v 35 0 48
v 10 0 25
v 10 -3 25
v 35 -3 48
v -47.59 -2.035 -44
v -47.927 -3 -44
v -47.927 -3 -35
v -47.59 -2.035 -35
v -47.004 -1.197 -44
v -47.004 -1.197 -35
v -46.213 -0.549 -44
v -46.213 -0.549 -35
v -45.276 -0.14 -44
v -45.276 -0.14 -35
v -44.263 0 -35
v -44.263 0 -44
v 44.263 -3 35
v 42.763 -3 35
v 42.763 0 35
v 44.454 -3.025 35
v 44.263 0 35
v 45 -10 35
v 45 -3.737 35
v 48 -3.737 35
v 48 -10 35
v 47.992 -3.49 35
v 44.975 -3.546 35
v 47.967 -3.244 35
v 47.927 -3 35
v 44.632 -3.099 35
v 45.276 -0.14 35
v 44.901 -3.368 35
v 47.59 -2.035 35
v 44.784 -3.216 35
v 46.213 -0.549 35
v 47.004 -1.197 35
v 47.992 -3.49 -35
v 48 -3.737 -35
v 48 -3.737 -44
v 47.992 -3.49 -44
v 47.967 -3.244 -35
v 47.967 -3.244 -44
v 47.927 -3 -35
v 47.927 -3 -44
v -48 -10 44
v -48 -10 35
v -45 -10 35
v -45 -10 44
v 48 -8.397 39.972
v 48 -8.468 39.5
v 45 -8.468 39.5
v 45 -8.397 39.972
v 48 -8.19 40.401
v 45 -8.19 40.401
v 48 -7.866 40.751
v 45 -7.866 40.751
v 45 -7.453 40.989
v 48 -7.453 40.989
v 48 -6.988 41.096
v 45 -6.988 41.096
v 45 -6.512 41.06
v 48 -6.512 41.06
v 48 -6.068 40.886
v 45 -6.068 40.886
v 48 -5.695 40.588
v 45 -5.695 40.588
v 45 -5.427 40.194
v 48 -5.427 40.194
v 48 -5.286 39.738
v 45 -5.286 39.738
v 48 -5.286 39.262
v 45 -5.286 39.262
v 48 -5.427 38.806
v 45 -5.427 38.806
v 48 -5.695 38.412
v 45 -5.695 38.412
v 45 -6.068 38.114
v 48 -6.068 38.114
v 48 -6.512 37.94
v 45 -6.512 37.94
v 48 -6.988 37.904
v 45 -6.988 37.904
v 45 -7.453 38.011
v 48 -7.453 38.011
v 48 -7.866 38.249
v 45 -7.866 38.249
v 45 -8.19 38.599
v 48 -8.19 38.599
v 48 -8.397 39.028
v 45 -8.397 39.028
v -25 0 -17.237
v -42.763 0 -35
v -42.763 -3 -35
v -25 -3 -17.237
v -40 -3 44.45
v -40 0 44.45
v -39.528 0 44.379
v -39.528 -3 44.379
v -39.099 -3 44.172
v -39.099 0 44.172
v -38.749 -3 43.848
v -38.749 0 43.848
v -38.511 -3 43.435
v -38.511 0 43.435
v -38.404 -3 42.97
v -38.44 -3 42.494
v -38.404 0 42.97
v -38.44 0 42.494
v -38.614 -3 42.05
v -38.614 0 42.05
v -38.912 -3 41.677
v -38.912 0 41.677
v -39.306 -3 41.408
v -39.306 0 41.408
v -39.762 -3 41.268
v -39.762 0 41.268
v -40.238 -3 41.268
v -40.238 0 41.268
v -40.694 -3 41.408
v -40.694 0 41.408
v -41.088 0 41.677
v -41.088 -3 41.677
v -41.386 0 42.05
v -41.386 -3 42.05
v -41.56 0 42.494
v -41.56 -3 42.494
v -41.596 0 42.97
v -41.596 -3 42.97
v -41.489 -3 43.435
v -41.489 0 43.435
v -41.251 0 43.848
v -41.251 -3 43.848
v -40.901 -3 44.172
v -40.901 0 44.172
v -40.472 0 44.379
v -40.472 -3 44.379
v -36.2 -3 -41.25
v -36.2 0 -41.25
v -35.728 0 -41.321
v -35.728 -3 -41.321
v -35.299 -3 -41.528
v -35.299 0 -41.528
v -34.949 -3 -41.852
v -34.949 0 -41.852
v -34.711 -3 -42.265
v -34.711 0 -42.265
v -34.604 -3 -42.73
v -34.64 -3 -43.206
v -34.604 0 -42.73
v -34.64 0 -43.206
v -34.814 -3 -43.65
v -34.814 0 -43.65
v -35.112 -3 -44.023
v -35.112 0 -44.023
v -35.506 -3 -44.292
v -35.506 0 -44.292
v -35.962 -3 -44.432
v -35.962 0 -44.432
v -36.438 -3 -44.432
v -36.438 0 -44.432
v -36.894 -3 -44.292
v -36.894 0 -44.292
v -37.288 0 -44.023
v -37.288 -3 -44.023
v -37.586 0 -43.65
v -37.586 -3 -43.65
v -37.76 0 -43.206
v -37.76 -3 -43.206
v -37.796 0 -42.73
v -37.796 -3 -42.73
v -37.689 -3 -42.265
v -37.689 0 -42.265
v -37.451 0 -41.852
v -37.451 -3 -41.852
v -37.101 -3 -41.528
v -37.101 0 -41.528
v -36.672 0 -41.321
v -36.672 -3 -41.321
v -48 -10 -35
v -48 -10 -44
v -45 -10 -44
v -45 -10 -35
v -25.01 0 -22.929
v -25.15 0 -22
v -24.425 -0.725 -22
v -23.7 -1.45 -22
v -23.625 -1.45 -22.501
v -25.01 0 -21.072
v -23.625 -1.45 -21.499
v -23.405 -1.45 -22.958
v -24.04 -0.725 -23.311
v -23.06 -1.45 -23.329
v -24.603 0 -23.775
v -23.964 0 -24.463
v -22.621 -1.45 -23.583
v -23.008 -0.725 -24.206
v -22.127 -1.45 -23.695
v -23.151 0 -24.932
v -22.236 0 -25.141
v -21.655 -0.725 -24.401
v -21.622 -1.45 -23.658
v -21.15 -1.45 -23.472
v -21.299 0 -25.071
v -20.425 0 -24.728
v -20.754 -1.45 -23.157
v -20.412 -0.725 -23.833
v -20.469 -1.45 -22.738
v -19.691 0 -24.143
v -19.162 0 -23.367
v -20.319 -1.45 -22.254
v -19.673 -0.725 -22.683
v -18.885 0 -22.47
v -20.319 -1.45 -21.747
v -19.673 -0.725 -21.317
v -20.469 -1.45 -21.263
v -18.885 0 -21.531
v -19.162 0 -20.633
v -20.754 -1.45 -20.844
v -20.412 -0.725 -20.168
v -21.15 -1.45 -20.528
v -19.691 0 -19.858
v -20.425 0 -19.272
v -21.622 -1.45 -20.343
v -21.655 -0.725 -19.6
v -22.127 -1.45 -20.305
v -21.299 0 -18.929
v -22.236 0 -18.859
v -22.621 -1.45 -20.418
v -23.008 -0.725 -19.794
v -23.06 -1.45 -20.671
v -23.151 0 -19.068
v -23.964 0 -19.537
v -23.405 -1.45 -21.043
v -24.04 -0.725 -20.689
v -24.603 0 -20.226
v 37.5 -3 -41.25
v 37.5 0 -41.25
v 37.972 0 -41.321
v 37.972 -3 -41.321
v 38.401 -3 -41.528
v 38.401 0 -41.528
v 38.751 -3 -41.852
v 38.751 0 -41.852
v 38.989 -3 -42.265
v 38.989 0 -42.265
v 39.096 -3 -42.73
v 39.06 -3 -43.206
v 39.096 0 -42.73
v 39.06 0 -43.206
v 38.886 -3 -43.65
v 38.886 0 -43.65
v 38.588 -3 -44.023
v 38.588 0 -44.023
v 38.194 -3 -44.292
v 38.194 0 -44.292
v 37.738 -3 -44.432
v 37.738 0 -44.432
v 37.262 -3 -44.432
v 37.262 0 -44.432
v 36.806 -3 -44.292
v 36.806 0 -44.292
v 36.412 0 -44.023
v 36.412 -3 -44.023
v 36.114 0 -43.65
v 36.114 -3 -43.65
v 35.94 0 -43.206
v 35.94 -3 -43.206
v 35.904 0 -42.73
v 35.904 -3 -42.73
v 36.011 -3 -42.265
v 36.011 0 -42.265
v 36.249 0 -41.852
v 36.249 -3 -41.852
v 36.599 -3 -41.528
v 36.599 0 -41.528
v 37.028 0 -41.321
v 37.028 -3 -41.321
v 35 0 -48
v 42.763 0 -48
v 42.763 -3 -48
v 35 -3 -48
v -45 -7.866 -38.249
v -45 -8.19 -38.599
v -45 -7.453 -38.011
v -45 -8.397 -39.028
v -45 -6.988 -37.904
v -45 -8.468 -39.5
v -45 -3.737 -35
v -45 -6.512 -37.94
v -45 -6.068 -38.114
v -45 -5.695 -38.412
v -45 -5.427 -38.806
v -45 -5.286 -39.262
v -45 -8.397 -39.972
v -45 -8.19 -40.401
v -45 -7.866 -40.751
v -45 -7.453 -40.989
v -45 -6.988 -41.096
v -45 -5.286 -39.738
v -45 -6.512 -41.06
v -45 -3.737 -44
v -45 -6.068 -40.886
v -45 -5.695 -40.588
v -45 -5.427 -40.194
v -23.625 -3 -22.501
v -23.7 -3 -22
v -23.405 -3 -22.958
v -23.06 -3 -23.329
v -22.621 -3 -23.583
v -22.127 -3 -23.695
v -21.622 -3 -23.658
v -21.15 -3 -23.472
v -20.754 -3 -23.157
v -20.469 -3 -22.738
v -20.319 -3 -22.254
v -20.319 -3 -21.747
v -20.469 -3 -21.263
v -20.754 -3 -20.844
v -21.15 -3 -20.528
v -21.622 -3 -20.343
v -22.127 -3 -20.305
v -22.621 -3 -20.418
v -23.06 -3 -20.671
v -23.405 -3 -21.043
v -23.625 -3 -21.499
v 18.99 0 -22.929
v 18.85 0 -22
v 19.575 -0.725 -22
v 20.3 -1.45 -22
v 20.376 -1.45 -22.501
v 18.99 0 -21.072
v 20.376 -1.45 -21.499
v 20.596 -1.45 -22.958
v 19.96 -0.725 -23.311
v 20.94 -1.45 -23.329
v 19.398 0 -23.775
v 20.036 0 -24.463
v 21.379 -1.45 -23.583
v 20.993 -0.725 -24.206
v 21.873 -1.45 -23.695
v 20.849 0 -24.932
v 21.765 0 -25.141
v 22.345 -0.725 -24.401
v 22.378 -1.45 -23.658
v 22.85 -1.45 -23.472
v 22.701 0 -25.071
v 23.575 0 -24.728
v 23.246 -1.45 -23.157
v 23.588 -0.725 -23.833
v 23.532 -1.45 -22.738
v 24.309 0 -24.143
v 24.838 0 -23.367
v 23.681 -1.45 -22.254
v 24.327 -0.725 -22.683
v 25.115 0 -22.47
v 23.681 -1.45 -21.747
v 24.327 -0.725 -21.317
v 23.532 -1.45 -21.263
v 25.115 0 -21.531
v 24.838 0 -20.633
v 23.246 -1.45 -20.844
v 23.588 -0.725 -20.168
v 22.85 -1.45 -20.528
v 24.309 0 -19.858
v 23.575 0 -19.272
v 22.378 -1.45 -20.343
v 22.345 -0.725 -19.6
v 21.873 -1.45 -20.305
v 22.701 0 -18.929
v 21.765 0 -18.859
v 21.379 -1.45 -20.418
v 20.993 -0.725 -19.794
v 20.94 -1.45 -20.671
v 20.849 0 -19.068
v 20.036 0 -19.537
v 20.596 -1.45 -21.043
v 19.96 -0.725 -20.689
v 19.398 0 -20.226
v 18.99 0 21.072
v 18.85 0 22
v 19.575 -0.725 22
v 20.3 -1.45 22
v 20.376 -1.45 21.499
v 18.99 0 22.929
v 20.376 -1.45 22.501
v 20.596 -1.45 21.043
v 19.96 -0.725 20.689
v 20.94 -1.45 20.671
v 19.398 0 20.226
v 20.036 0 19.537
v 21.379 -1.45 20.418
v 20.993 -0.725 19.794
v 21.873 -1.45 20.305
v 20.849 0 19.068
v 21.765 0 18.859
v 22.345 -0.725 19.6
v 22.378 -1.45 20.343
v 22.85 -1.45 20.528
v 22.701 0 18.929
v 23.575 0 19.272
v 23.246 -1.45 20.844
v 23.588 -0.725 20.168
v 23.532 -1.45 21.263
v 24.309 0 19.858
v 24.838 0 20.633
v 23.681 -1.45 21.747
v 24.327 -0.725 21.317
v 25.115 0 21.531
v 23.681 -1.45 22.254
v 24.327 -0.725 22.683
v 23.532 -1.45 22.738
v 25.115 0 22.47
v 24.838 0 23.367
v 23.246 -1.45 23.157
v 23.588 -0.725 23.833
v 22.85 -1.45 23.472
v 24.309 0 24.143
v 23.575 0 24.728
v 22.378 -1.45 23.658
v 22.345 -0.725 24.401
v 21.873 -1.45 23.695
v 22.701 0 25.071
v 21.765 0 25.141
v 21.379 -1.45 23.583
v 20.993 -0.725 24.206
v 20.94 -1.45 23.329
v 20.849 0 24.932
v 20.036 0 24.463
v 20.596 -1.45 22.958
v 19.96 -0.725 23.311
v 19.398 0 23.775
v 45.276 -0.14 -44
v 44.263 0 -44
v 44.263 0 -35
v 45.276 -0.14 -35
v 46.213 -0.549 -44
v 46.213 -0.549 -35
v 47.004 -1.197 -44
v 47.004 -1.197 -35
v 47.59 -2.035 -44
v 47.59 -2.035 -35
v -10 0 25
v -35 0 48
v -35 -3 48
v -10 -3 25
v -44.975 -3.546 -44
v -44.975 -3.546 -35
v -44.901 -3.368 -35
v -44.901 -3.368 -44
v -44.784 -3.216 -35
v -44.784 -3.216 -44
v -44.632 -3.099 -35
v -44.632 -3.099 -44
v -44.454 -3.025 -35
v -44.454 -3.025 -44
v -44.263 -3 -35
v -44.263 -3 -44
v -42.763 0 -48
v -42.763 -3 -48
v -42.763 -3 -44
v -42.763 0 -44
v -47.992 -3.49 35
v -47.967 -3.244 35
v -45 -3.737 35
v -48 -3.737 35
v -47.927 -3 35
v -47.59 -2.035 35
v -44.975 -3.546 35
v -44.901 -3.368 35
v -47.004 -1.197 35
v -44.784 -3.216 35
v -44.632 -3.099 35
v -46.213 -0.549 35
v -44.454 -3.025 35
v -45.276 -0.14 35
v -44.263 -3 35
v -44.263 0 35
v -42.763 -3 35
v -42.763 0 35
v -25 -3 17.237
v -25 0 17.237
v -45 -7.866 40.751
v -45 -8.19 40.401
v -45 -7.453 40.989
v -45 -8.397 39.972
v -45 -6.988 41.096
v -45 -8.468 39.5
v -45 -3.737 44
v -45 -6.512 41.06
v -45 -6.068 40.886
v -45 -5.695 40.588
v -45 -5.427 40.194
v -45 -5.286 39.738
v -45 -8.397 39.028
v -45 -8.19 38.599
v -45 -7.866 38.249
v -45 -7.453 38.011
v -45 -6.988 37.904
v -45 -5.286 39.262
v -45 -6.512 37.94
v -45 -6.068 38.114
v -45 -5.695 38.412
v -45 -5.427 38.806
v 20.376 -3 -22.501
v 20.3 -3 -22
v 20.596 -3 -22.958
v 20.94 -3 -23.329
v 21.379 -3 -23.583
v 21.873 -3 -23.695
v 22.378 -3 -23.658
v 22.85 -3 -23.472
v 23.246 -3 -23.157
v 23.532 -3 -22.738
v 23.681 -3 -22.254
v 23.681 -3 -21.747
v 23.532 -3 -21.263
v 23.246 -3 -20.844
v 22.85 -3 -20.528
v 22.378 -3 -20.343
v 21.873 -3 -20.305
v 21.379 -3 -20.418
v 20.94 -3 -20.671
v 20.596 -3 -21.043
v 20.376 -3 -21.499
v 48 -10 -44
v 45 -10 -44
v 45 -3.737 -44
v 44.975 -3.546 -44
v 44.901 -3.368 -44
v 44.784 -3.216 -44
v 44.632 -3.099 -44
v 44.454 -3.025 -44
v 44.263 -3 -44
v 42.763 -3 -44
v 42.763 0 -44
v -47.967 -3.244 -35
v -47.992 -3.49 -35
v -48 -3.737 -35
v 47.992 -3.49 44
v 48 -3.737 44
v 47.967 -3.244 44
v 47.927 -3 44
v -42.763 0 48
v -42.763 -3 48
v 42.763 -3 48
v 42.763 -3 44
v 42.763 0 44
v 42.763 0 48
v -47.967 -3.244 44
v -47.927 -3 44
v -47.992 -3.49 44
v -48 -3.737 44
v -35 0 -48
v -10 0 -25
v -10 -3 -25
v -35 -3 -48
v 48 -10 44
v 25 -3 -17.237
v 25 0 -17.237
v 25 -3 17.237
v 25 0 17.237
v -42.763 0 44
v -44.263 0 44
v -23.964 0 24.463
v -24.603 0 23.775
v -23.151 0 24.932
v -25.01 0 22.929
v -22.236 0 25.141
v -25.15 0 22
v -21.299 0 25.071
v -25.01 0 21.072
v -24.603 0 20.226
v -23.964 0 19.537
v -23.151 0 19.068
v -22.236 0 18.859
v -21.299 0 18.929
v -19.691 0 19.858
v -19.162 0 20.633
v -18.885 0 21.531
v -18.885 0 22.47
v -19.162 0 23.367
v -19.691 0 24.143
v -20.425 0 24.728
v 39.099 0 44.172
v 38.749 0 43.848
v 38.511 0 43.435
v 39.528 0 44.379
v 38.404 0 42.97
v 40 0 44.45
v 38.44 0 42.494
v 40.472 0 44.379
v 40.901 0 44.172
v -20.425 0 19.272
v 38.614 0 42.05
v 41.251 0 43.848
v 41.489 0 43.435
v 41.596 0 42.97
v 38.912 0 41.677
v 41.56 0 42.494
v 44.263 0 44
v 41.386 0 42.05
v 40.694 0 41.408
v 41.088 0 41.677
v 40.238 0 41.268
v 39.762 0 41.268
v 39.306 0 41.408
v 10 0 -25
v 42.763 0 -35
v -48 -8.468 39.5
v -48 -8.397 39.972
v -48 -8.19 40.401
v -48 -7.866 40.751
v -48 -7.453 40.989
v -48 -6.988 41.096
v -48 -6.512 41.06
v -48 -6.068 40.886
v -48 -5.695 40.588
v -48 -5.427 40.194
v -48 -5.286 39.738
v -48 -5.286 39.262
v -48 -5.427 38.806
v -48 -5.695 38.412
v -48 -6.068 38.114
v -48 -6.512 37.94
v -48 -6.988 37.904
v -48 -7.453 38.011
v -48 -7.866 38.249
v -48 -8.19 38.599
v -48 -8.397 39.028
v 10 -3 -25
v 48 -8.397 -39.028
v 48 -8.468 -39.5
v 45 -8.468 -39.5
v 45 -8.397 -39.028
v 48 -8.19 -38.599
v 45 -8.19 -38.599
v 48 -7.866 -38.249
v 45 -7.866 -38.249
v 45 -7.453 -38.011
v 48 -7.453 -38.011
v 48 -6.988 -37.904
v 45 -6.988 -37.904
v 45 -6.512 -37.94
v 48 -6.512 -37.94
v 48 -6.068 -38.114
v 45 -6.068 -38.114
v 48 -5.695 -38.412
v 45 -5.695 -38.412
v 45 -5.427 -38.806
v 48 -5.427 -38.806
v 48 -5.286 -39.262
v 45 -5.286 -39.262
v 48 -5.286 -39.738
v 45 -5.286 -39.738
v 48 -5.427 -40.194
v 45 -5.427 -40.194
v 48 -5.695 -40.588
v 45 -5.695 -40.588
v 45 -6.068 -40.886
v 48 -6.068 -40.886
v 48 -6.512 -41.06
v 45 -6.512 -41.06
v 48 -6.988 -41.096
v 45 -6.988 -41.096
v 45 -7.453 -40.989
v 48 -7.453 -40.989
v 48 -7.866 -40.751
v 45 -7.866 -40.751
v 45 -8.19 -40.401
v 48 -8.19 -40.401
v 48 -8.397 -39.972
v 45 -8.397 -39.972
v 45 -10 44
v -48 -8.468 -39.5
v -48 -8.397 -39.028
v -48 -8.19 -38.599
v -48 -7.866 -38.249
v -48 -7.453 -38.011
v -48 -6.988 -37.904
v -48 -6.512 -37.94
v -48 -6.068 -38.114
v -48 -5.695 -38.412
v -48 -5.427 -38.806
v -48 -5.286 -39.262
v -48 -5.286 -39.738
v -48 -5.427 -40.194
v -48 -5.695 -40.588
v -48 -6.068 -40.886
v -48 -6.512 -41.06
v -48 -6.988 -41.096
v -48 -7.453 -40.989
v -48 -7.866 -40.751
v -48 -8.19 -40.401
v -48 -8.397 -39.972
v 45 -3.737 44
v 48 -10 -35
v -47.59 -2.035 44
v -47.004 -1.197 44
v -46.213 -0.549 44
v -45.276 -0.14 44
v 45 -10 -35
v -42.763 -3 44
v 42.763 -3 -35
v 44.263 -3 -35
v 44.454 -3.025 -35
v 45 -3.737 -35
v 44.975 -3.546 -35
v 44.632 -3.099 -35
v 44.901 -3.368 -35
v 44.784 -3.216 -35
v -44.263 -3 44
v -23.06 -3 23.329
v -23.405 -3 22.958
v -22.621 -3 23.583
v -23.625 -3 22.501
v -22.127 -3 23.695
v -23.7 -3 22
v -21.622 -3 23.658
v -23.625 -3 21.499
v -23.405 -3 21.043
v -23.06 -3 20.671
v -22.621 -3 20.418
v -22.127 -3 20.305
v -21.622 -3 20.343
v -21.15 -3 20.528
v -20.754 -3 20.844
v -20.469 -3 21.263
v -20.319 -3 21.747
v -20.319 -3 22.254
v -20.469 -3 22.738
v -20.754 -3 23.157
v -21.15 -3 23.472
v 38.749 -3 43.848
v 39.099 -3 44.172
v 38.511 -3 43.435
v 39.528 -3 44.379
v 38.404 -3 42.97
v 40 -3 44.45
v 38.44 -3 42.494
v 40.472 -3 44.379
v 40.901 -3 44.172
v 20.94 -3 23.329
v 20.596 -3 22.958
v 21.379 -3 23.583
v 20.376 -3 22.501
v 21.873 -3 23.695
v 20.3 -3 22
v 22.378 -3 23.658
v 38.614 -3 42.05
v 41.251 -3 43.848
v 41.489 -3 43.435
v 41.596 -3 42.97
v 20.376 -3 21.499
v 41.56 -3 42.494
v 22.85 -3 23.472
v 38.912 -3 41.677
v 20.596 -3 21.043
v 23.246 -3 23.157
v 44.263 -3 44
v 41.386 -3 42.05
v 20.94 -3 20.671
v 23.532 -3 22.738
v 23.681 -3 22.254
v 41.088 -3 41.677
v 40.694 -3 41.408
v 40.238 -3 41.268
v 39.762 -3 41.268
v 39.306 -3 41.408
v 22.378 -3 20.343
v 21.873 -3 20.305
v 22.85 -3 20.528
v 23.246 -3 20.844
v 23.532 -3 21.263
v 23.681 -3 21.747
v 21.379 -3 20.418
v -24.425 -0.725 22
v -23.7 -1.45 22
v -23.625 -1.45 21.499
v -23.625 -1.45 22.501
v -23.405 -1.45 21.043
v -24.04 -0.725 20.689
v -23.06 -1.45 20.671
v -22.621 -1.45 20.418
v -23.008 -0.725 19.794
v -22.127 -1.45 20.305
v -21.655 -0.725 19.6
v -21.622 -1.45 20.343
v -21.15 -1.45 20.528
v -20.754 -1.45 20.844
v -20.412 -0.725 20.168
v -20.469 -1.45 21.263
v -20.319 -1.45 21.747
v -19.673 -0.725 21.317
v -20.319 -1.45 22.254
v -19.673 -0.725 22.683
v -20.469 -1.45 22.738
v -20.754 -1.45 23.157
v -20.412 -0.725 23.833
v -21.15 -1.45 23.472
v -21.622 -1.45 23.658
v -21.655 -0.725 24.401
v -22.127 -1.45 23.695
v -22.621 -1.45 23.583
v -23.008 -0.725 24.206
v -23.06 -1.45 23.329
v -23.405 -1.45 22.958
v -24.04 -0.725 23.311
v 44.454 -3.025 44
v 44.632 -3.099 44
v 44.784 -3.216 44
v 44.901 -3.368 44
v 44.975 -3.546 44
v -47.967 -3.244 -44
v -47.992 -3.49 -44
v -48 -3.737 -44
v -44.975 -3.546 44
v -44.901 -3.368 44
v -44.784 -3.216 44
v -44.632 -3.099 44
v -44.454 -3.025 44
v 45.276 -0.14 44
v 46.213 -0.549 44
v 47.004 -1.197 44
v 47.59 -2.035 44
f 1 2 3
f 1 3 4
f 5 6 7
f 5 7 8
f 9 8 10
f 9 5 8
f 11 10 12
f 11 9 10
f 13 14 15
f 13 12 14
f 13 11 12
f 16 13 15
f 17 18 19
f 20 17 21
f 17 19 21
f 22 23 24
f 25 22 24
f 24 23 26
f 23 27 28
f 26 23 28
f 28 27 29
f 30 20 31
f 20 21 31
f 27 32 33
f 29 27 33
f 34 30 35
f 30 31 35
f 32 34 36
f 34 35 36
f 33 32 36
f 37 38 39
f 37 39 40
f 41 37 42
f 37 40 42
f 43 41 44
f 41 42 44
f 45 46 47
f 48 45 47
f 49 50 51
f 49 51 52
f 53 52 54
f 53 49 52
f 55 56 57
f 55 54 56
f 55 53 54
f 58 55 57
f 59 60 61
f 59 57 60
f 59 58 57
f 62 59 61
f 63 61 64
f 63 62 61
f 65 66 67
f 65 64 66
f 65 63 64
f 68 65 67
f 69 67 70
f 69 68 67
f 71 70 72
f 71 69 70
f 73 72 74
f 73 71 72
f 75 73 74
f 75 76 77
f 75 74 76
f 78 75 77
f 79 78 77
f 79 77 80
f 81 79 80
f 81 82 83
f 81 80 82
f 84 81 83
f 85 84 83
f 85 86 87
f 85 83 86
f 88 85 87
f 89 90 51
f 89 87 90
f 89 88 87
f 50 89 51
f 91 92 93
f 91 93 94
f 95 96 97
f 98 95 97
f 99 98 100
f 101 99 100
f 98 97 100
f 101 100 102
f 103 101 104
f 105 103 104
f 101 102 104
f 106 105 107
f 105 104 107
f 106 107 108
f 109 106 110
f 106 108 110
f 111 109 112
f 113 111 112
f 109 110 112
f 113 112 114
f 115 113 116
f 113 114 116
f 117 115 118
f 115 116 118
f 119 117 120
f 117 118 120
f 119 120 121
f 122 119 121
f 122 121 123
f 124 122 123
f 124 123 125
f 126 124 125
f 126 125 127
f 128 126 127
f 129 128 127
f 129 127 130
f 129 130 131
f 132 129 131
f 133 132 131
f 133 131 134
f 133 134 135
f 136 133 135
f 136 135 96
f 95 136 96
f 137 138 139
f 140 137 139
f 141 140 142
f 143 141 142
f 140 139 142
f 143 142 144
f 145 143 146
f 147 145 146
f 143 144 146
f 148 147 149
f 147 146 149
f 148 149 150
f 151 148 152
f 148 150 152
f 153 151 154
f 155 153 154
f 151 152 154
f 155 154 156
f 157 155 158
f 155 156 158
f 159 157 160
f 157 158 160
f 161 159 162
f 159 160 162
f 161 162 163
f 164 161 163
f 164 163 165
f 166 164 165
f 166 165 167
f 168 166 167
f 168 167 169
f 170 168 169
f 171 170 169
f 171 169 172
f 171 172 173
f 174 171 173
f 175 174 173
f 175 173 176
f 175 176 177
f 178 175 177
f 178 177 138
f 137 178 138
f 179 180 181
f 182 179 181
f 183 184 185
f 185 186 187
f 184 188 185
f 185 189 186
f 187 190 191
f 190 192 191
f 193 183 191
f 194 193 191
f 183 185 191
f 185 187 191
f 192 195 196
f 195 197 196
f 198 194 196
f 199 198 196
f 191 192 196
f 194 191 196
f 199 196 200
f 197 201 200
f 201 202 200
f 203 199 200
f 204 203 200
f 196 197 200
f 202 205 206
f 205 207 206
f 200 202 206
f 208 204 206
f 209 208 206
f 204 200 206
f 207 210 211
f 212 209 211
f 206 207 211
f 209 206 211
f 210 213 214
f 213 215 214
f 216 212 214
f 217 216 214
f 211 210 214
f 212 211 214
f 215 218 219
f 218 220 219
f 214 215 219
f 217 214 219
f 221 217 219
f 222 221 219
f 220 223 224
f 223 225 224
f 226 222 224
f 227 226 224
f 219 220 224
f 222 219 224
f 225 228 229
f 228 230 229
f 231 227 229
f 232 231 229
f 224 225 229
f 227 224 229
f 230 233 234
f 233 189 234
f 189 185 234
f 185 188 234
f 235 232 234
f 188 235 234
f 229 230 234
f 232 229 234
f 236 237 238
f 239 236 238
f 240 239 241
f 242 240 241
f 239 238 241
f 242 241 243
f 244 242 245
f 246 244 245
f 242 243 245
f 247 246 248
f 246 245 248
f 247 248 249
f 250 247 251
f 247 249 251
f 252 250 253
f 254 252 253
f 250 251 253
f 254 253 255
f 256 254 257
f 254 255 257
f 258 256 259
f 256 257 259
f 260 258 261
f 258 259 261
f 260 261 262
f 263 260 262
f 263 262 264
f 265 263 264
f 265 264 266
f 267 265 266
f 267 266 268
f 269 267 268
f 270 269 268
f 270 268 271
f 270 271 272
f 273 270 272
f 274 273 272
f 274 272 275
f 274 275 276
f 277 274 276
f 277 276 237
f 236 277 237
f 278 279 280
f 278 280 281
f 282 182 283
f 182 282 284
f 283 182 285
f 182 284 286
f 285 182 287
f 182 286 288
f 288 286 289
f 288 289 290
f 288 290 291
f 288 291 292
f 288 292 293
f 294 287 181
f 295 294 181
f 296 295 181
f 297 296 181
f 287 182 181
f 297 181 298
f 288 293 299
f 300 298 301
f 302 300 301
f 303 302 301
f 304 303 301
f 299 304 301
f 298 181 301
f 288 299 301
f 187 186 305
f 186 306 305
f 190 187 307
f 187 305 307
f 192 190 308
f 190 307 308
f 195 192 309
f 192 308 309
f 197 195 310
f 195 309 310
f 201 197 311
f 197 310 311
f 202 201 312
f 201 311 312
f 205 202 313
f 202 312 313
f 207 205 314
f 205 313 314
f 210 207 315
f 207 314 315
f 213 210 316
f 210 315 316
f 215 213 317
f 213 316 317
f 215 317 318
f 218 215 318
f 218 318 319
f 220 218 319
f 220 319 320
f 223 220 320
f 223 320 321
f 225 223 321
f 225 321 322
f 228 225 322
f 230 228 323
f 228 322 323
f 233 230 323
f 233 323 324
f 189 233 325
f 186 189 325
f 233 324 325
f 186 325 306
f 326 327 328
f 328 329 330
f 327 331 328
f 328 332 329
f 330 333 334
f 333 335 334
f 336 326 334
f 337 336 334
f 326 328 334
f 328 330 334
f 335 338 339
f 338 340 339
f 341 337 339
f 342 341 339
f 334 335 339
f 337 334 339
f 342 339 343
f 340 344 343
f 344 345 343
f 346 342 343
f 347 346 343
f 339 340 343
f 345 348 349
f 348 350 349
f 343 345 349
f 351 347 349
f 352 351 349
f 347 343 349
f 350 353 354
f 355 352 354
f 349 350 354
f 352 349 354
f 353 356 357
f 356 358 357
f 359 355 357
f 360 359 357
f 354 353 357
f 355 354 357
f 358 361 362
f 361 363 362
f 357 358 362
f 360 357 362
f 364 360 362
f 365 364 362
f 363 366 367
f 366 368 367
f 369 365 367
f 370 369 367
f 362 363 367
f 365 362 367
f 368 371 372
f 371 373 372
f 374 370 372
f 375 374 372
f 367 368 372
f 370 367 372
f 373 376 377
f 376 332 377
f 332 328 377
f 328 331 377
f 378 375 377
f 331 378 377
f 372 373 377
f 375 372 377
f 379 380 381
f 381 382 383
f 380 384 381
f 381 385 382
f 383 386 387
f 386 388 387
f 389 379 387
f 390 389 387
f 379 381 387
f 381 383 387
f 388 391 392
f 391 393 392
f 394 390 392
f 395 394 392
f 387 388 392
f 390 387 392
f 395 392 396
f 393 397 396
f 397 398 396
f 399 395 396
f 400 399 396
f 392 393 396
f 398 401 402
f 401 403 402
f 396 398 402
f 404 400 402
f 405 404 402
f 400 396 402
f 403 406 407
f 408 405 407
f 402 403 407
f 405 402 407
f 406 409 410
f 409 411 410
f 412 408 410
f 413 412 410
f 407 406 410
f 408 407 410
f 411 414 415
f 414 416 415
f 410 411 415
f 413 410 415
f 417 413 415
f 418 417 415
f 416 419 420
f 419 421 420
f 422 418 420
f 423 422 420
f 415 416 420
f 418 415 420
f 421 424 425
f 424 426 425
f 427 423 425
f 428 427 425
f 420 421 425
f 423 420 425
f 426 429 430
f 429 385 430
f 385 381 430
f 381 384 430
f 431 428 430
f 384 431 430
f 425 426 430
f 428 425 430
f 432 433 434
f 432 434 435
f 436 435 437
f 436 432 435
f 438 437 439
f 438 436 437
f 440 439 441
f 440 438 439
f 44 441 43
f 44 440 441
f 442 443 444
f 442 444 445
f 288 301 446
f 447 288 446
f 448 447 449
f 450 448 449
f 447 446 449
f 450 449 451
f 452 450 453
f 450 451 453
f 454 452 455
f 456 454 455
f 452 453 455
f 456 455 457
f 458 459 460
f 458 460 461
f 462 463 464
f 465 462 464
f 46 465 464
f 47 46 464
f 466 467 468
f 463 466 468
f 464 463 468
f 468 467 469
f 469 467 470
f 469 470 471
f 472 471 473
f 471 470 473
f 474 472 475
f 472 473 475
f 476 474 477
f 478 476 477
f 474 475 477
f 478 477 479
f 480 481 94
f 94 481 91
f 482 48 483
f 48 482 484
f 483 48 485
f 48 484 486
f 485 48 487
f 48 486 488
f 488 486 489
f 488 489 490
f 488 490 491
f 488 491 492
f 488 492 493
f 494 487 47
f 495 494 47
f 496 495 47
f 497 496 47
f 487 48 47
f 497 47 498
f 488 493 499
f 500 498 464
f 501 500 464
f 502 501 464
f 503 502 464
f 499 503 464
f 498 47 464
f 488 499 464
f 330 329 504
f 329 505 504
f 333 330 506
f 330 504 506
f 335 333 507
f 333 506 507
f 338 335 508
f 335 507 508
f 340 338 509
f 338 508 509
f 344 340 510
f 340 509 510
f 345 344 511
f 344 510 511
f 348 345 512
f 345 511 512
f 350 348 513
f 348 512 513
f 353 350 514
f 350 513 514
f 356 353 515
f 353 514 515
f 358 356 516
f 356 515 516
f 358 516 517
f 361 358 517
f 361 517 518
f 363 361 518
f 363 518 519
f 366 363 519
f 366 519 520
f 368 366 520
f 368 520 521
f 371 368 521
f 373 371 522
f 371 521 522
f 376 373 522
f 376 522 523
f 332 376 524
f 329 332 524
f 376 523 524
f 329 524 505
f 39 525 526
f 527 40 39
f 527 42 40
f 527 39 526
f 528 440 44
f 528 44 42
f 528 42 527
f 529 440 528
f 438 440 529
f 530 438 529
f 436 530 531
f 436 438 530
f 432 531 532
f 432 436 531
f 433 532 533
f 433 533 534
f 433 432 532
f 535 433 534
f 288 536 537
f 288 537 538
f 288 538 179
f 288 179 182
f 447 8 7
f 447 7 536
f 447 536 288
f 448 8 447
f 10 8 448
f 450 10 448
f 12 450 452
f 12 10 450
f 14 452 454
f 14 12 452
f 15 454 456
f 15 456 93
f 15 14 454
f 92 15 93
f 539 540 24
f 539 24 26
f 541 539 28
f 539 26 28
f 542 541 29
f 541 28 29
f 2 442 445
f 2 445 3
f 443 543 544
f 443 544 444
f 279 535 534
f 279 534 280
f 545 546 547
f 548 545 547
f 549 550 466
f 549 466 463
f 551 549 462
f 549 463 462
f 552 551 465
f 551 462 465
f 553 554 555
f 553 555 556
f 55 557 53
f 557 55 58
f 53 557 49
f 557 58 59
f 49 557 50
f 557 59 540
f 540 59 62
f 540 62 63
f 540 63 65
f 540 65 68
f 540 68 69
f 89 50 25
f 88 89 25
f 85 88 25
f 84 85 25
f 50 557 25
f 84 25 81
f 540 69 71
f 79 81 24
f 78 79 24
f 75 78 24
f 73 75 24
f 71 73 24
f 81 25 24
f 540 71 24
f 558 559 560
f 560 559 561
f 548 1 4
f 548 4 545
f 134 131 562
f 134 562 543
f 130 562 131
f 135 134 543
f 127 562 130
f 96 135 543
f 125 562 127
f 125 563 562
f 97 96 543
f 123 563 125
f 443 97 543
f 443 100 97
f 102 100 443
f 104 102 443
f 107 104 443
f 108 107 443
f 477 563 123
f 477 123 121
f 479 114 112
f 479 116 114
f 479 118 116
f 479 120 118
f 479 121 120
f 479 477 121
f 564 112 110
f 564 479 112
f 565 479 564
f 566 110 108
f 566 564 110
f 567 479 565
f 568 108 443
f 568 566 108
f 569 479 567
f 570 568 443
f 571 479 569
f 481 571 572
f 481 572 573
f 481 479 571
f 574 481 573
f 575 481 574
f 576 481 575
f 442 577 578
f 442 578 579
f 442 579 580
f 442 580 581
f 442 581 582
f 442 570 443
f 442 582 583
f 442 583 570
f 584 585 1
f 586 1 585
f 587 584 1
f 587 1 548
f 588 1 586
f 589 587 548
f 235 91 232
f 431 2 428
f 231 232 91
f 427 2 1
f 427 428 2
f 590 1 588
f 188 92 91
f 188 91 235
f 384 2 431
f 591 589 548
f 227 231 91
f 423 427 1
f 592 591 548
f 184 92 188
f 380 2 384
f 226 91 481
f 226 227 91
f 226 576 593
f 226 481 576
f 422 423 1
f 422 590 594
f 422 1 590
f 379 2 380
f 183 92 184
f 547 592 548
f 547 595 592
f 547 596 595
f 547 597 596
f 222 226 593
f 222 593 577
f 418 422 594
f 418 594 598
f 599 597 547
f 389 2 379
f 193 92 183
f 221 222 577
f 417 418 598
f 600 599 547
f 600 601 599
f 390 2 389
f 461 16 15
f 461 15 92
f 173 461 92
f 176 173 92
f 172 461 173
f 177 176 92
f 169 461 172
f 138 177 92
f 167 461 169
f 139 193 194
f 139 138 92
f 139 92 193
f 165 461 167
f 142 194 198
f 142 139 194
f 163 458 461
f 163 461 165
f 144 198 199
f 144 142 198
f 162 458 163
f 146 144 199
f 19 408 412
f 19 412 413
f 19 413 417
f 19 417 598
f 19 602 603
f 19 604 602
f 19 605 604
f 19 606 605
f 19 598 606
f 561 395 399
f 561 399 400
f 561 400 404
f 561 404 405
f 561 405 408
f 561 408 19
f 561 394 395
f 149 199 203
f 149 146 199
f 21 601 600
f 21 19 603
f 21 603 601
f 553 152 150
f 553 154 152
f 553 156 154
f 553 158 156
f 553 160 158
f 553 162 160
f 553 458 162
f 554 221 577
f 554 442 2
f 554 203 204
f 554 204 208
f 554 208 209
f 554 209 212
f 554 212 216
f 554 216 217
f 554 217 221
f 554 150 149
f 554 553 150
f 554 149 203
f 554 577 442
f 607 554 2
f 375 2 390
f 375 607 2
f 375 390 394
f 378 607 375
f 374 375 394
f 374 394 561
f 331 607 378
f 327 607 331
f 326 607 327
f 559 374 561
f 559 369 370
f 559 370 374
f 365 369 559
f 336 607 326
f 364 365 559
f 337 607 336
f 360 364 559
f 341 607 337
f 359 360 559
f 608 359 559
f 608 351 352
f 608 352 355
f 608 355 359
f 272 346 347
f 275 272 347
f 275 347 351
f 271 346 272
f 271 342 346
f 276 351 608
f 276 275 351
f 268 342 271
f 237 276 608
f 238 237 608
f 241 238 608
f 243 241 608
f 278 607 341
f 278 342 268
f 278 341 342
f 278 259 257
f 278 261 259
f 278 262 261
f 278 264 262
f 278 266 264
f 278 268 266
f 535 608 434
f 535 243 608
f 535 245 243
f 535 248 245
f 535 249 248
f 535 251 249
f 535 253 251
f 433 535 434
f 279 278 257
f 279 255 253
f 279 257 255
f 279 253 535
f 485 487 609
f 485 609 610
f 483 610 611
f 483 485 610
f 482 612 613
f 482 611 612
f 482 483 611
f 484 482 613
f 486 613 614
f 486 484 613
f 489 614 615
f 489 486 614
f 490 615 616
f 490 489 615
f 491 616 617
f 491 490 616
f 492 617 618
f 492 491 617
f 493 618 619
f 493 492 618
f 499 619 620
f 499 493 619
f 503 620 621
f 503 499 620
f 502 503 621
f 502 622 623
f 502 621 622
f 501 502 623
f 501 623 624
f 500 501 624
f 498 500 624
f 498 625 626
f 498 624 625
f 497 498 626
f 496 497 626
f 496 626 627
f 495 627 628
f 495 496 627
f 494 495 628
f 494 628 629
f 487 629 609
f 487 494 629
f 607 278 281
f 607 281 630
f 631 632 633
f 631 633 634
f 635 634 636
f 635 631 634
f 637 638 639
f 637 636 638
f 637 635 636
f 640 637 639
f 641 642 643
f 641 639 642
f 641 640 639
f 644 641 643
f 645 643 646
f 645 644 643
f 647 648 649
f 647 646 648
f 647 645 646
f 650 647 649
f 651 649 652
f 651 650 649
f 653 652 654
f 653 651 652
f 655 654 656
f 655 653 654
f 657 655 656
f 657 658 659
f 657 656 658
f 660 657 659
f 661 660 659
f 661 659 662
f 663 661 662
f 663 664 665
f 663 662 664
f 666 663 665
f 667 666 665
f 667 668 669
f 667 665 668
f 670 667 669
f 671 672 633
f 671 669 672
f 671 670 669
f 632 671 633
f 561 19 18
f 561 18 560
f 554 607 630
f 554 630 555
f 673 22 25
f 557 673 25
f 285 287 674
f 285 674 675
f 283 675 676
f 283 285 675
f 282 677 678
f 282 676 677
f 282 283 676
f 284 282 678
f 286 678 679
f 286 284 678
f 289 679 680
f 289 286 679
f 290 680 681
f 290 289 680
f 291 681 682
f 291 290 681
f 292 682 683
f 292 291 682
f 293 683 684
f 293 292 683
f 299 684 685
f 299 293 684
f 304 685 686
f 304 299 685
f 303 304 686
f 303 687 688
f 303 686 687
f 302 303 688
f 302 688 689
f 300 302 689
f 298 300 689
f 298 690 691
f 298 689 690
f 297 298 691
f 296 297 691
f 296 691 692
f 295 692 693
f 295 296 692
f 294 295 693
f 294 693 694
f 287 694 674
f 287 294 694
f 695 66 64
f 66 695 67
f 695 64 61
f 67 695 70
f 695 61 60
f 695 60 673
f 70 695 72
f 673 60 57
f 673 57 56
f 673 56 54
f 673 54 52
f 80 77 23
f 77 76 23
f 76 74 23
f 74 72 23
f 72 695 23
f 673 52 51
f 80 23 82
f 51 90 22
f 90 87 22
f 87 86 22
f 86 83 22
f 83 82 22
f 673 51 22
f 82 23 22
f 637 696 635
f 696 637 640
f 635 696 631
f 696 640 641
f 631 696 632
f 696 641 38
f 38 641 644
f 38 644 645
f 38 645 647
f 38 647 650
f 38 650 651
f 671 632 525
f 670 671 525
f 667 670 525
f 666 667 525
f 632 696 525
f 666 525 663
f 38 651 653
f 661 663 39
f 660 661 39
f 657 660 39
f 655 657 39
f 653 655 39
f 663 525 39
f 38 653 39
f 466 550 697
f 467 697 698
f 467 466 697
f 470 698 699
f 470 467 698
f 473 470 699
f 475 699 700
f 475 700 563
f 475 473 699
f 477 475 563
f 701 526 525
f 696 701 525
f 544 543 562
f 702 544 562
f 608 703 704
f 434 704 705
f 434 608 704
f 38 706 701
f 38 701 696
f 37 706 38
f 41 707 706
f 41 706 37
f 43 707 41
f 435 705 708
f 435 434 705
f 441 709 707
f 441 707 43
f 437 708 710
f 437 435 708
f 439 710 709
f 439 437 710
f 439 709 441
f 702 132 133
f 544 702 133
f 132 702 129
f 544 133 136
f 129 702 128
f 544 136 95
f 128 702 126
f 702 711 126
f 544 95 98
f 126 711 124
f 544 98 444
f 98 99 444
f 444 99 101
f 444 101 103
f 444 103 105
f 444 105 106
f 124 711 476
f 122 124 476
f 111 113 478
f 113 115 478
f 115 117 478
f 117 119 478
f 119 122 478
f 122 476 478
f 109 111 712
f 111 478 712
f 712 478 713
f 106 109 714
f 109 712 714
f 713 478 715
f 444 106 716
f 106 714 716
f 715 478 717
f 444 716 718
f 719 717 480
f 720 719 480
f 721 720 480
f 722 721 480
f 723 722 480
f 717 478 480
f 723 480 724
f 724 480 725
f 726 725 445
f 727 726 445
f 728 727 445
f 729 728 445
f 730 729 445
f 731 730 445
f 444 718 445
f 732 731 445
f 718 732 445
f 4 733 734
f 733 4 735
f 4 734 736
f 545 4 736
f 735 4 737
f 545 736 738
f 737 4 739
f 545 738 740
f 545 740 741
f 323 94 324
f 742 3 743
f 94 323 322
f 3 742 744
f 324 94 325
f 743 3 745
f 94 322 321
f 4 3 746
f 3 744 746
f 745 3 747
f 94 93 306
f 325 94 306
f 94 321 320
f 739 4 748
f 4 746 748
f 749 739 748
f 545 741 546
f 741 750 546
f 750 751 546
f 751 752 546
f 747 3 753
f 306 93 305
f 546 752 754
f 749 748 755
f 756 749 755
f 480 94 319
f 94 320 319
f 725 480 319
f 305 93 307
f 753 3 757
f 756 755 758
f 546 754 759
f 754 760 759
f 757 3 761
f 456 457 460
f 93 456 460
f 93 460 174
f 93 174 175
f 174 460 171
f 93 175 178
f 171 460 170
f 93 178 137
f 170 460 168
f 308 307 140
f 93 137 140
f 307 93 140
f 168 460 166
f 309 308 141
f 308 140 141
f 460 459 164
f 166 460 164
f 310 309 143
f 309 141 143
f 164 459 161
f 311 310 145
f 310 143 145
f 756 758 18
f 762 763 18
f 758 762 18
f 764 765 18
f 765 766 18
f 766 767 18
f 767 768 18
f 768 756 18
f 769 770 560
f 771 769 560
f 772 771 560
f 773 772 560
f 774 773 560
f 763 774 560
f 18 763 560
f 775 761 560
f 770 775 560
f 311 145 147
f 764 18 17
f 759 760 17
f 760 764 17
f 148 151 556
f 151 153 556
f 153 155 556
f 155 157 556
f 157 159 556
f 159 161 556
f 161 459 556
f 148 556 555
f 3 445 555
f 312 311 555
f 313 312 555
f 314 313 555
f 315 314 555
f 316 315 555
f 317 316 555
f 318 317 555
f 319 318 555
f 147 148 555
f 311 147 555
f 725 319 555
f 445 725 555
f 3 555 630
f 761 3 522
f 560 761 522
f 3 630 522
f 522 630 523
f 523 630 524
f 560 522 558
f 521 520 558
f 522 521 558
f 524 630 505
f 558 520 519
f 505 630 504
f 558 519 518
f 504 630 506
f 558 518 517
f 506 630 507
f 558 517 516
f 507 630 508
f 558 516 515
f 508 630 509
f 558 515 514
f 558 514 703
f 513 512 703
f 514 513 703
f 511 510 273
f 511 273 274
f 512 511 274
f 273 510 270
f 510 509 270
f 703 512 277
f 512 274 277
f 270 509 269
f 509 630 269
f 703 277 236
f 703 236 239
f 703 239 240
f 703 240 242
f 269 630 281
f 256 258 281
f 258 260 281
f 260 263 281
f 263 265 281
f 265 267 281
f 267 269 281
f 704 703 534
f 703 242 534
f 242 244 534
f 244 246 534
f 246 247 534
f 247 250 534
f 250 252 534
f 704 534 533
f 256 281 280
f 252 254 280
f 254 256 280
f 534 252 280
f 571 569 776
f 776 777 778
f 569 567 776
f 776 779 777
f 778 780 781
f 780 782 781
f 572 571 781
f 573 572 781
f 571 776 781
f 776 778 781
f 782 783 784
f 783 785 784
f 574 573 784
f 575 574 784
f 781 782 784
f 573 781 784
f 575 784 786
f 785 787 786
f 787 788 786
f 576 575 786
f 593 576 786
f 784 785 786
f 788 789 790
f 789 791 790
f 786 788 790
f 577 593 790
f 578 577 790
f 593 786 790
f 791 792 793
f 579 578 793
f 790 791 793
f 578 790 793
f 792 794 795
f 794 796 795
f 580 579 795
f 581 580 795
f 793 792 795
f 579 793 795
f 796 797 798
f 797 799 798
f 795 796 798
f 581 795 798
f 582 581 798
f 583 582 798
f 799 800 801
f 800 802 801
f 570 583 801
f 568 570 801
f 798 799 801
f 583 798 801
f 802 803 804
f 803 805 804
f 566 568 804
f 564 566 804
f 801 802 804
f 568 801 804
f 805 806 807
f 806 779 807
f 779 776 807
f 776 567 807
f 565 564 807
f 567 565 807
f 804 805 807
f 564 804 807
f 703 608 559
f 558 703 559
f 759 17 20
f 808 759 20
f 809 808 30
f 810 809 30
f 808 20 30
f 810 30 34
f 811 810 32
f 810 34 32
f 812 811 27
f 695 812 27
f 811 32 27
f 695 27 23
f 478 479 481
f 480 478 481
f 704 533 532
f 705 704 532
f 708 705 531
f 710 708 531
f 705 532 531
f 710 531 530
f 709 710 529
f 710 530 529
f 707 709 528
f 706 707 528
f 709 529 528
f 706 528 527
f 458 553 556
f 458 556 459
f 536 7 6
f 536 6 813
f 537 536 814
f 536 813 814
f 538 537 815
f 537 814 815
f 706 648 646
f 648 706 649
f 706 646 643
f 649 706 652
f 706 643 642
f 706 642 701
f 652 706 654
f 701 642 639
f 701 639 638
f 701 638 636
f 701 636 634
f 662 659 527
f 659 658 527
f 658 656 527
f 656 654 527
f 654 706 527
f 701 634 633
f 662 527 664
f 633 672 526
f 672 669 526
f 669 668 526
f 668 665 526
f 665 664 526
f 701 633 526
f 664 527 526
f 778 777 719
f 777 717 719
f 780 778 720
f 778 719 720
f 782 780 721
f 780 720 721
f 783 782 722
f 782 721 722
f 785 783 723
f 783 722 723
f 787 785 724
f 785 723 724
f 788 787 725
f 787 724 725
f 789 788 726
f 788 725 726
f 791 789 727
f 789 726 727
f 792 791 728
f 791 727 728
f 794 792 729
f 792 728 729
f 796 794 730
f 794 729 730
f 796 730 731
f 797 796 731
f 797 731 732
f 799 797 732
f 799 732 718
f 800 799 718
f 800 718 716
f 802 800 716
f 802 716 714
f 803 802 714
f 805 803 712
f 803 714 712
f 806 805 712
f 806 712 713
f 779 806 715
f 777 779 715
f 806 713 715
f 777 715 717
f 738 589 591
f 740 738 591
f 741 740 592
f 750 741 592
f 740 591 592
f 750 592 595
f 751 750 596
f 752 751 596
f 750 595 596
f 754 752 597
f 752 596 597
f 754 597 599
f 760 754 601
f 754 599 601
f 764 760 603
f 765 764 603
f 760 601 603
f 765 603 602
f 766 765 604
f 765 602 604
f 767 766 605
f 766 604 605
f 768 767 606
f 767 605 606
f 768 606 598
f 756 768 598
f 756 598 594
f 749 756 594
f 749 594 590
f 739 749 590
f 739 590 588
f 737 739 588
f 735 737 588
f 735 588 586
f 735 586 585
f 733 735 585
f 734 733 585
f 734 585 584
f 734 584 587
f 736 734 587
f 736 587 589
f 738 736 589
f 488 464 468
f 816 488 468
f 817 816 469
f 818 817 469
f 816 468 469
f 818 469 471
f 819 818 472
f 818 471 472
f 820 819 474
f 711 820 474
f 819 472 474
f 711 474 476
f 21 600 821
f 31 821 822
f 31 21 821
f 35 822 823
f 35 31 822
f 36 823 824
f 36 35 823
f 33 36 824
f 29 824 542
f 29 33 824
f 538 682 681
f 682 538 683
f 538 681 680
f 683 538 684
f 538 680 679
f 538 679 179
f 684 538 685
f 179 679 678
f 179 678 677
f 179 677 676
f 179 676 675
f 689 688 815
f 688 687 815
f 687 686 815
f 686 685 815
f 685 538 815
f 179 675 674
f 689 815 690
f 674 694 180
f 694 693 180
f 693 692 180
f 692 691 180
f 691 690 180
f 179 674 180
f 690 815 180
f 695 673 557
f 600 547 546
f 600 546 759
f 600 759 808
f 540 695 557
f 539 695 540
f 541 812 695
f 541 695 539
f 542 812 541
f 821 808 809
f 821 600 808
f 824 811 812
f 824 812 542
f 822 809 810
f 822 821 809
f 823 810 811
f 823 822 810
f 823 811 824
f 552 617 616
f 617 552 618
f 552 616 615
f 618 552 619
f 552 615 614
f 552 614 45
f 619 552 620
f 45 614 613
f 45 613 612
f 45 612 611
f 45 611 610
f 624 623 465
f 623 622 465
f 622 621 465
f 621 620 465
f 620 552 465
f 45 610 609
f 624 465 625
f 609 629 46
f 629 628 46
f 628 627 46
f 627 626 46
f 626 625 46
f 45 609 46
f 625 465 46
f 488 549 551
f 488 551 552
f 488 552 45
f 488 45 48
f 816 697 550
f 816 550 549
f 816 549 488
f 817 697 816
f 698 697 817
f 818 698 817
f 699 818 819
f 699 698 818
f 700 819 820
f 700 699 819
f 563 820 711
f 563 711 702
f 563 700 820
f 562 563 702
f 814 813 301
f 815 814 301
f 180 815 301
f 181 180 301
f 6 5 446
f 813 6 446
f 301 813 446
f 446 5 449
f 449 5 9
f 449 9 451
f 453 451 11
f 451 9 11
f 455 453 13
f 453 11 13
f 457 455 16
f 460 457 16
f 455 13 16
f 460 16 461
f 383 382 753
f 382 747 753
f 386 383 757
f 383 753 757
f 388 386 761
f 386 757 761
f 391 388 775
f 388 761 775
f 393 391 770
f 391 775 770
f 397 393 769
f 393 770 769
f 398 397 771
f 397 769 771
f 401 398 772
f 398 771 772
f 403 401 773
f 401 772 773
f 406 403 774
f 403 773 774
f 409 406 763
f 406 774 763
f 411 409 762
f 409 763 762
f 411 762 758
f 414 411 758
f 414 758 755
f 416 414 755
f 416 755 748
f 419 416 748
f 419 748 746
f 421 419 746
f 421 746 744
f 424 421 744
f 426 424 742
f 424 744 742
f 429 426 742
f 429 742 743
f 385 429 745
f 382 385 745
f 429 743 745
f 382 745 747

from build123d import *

# Parameters (mm, degrees)
SKETCH1_R                                       = 1.6
BASE_FLANGE1_DEPTH                              = 3
EDGE_FLANGE1_START                              = -44
EDGE_FLANGE1_DEPTH                              = 10.5
EDGE_FLANGE1_START_2                            = 33.5
EDGE_FLANGE1_2_DEPTH                            = 10.5
EDGE_FLANGE1_START_3                            = -35
EDGE_FLANGE1_3_DEPTH                            = 1.5
EDGE_FLANGE1_4_DEPTH                            = 1.5
EDGE_FLANGE1_START_4                            = -45.5
EDGE_FLANGE1_5_OUTLINE_W                        = 1.2366
EDGE_FLANGE1_5_OUTLINE_H                        = 3
EDGE_FLANGE1_5_DEPTH                            = 1.5
EDGE_FLANGE1_START_5                            = 44
EDGE_FLANGE1_6_OUTLINE_W                        = 1.2366
EDGE_FLANGE1_6_OUTLINE_H                        = 3
EDGE_FLANGE1_6_DEPTH                            = 1.5
EDGE_FLANGE1_7_DEPTH                            = 9
EDGE_FLANGE1_START_6                            = 35
EDGE_FLANGE1_8_DEPTH                            = 9
CUT_EXTRUDE2_DEPTH                              = 108.796103826
CUT_EXTRUDE2_DEPTH_BACK                         = 108.796103826
SKETCH27_R                                      = 1.6
SKETCH29_R                                      = 1.6
CUT_EXTRUDE4_DEPTH                              = 69.614867194
SKETCH40_W                                      = 1.2366
SKETCH40_H                                      = 2.5
CUT_EXTRUDE5_DEPTH                              = 69.614867194
CSK_FOR_M3_FLAT_HEAD_MACHINE_SCREW1_D           = 3.4
CSK_FOR_M3_FLAT_HEAD_MACHINE_SCREW1_CSINK_D     = 6.3
CSK_FOR_M3_FLAT_HEAD_MACHINE_SCREW1_CSINK_ANGLE = 90


# Read off the part's stored shape, not the designer's step: Edge-Flange1
# Sheet-metal steps are written as plain solids
with BuildPart() as part:
    # Sketch1 → Base-Flange1 (new body)
    with BuildSketch(Plane(origin=(0, 0, 0), x_dir=(1, 0, 0), z_dir=(0, 1, 0))):
        Polygon((-10, 25), (-35, 48), (-44, 48), (-44, 44), (-48, 44), (-48, 35), (-25, 10), (-25, -10), (-48, -35), (-48, -44), (-44, -44), (-44, -48), (-35, -48), (-10, -25), (10, -25), (35, -48), (44, -48), (44, -44), (48, -44), (48, -35), (25, -10), (25, 10), (48, 35), (48, 44), (44, 44), (44, 48), (35, 48), (10, 25), align=None)
        with Locations(Location((-22.000213283, 22.000213283, 0), (0, 0, 270))):
            Circle(SKETCH1_R, mode=Mode.SUBTRACT)
        with Locations(Location((22.000213283, 22.000213283, 0), (0, 0, 270))):
            Circle(SKETCH1_R, mode=Mode.SUBTRACT)
        with Locations(Location((22.000213283, -22.000213283, 0), (0, 0, 270))):
            Circle(SKETCH1_R, mode=Mode.SUBTRACT)
        with Locations(Location((-22.000213283, -22.000213283, 0), (0, 0, 270))):
            Circle(SKETCH1_R, mode=Mode.SUBTRACT)
    extrude(amount=-BASE_FLANGE1_DEPTH)

    # Edge-Flange1 outline → Edge-Flange1 (cut)
    with BuildSketch(Plane.XY.offset(EDGE_FLANGE1_START)):
        with BuildLine():
            ThreePointArc((-47.926677222, -3), (-46.630867001, -0.845704021), (-44.2634, 0))
            Line((-44.2634, 0), (-48, 0))
            Line((-48, 0), (-48, -3))
            Line((-48, -3), (-47.926677222, -3))
        make_face()
        with BuildLine():
            Line((48, 0), (44.2634, 0))
            ThreePointArc((44.2634, 0), (46.630867001, -0.845704021), (47.926677222, -3))
            Line((47.926677222, -3), (48, -3))
            Line((48, -3), (48, 0))
        make_face()
    extrude(amount=EDGE_FLANGE1_DEPTH, mode=Mode.SUBTRACT)

    # Edge-Flange1 2 outline → Edge-Flange1 2 (cut)
    with BuildSketch(Plane.XY.offset(EDGE_FLANGE1_START_2)):
        with BuildLine():
            ThreePointArc((-47.926677222, -3), (-46.630867001, -0.845704021), (-44.2634, 0))
            Line((-44.2634, 0), (-48, 0))
            Line((-48, 0), (-48, -3))
            Line((-48, -3), (-47.926677222, -3))
        make_face()
        with BuildLine():
            Line((48, 0), (44.2634, 0))
            ThreePointArc((44.2634, 0), (46.630867001, -0.845704021), (47.926677222, -3))
            Line((47.926677222, -3), (48, -3))
            Line((48, -3), (48, 0))
        make_face()
    extrude(amount=EDGE_FLANGE1_2_DEPTH, mode=Mode.SUBTRACT)

    # Edge-Flange1 3 outline → Edge-Flange1 3 (cut)
    with BuildSketch(Plane.XY.offset(EDGE_FLANGE1_START_3)):
        with BuildLine():
            Line((-42.7634, -3), (-42.7634, 0))
            Line((-42.7634, 0), (-44.2634, 0))
            ThreePointArc((-44.2634, 0), (-46.630867001, -0.845704021), (-47.926677222, -3))
            Line((-47.926677222, -3), (-42.7634, -3))
        make_face()
        with BuildLine():
            Line((42.7634, 0), (42.7634, -3))
            Line((42.7634, -3), (47.926677222, -3))
            ThreePointArc((47.926677222, -3), (46.630867001, -0.845704021), (44.2634, 0))
            Line((44.2634, 0), (42.7634, 0))
        make_face()
    extrude(amount=EDGE_FLANGE1_3_DEPTH, mode=Mode.SUBTRACT)

    # Edge-Flange1 4 outline → Edge-Flange1 4 (cut)
    with BuildSketch(Plane.XY.offset(EDGE_FLANGE1_START_2)):
        with BuildLine():
            Line((-42.7634, -3), (-42.7634, 0))
            Line((-42.7634, 0), (-44.2634, 0))
            ThreePointArc((-44.2634, 0), (-46.630867001, -0.845704021), (-47.926677222, -3))
            Line((-47.926677222, -3), (-42.7634, -3))
        make_face()
        with BuildLine():
            Line((42.7634, 0), (42.7634, -3))
            Line((42.7634, -3), (47.926677222, -3))
            ThreePointArc((47.926677222, -3), (46.630867001, -0.845704021), (44.2634, 0))
            Line((44.2634, 0), (42.7634, 0))
        make_face()
    extrude(amount=EDGE_FLANGE1_4_DEPTH, mode=Mode.SUBTRACT)

    # Edge-Flange1 5 outline → Edge-Flange1 5 (cut)
    with BuildSketch(Plane.XY.offset(EDGE_FLANGE1_START_4)):
        with Locations((-43.3817, -1.5)):
            Rectangle(EDGE_FLANGE1_5_OUTLINE_W, EDGE_FLANGE1_5_OUTLINE_H)
        with Locations((43.3817, -1.5)):
            Rectangle(EDGE_FLANGE1_5_OUTLINE_W, EDGE_FLANGE1_5_OUTLINE_H)
    extrude(amount=EDGE_FLANGE1_5_DEPTH, mode=Mode.SUBTRACT)

    # Edge-Flange1 6 outline → Edge-Flange1 6 (cut)
    with BuildSketch(Plane.XY.offset(EDGE_FLANGE1_START_5)):
        with Locations((-43.3817, -1.5)):
            Rectangle(EDGE_FLANGE1_6_OUTLINE_W, EDGE_FLANGE1_6_OUTLINE_H)
        with Locations((43.3817, -1.5)):
            Rectangle(EDGE_FLANGE1_6_OUTLINE_W, EDGE_FLANGE1_6_OUTLINE_H)
    extrude(amount=EDGE_FLANGE1_6_DEPTH, mode=Mode.SUBTRACT)

    # Edge-Flange1 7 outline → Edge-Flange1 7 (add)
    with BuildSketch(Plane.XY.offset(EDGE_FLANGE1_START)):
        with BuildLine():
            ThreePointArc((-45, -3.7366), (-44.784254855, -3.215745145), (-44.2634, -3))
            Line((-44.2634, -3), (-47.926677222, -3))
            ThreePointArc((-47.926677222, -3), (-47.981624121, -3.36647982), (-48, -3.7366))
            Line((-48, -3.7366), (-48, -10))
            Line((-48, -10), (-45, -10))
            Line((-45, -10), (-45, -3.7366))
        make_face()
        with BuildLine():
            Line((47.926677222, -3), (44.2634, -3))
            ThreePointArc((44.2634, -3), (44.784254855, -3.215745145), (45, -3.7366))
            Line((45, -3.7366), (45, -10))
            Line((45, -10), (48, -10))
            Line((48, -10), (48, -3.7366))
            ThreePointArc((48, -3.7366), (47.981624121, -3.36647982), (47.926677222, -3))
        make_face()
    extrude(amount=EDGE_FLANGE1_7_DEPTH)

    # Edge-Flange1 8 outline → Edge-Flange1 8 (add)
    with BuildSketch(Plane.XY.offset(EDGE_FLANGE1_START_6)):
        with BuildLine():
            ThreePointArc((-45, -3.7366), (-44.784254855, -3.215745145), (-44.2634, -3))
            Line((-44.2634, -3), (-47.926677222, -3))
            ThreePointArc((-47.926677222, -3), (-47.981624121, -3.36647982), (-48, -3.7366))
            Line((-48, -3.7366), (-48, -10))
            Line((-48, -10), (-45, -10))
            Line((-45, -10), (-45, -3.7366))
        make_face()
        with BuildLine():
            Line((47.926677222, -3), (44.2634, -3))
            ThreePointArc((44.2634, -3), (44.784254855, -3.215745145), (45, -3.7366))
            Line((45, -3.7366), (45, -10))
            Line((45, -10), (48, -10))
            Line((48, -10), (48, -3.7366))
            ThreePointArc((48, -3.7366), (47.981624121, -3.36647982), (47.926677222, -3))
        make_face()
    extrude(amount=EDGE_FLANGE1_8_DEPTH)

    # Sketch27 → Cut-Extrude2 (cut, two sides: drawn at the far end of the back side and taken through both)
    with BuildSketch(Plane.ZY.offset(48).offset(-CUT_EXTRUDE2_DEPTH_BACK)):
        with Locations(Location((39.5, -6.8683, 0), (0, 0, 270))):
            Circle(SKETCH27_R)
        with Locations(Location((-39.5, -6.8683, 0), (0, 0, 270))):
            Circle(SKETCH27_R)
    extrude(amount=CUT_EXTRUDE2_DEPTH + CUT_EXTRUDE2_DEPTH_BACK, mode=Mode.SUBTRACT)

    # Sketch29 → Cut-Extrude4 (cut, through all)
    with BuildSketch(Plane(origin=(0, 0, 0), x_dir=(1, 0, 0), z_dir=(0, 1, 0))):
        with Locations(Location((-36.2, 42.85, 0), (0, 0, 270))):
            Circle(SKETCH29_R)
        with Locations(Location((37.5, 42.85, 0), (0, 0, 270))):
            Circle(SKETCH29_R)
        with Locations(Location((40, -42.85, 0), (0, 0, 270))):
            Circle(SKETCH29_R)
        with Locations(Location((-40, -42.85, 0), (0, 0, 270))):
            Circle(SKETCH29_R)
    extrude(amount=-CUT_EXTRUDE4_DEPTH, mode=Mode.SUBTRACT)

    # Sketch40 → Cut-Extrude5 (cut, through all)
    with BuildSketch(Plane(origin=(0, 0, 0), x_dir=(1, 0, 0), z_dir=(0, 1, 0))):
        Polygon((-42.7634, 35), (-25, 17.2366), (-25, 10), (-46.62, 33.5), (-42.7634, 33.5), align=None)
        with Locations((-43.3817, 46.75)):
            Rectangle(SKETCH40_W, SKETCH40_H)
        Polygon((42.7634, 33.5), (42.7634, 35), (25, 17.2366), (25, 10), (46.62, 33.5), align=None)
        with Locations((43.3817, 46.75)):
            Rectangle(SKETCH40_W, SKETCH40_H)
        Polygon((42.7634, -35), (25, -17.2366), (25, -10), (46.62, -33.5), (42.7634, -33.5), align=None)
        with Locations((43.3817, -46.75)):
            Rectangle(SKETCH40_W, SKETCH40_H)
        Polygon((-42.7634, -33.5), (-42.7634, -35), (-25, -17.2366), (-25, -10), (-46.62, -33.5), align=None)
        with Locations((-43.3817, -46.75)):
            Rectangle(SKETCH40_W, SKETCH40_H)
    extrude(amount=-CUT_EXTRUDE5_DEPTH, mode=Mode.SUBTRACT)

    # CSK for M3 Flat Head Machine Screw1 (through all)
    with Locations(Plane(origin=(0, 0, 0), x_dir=(1, 0, 0), z_dir=(0, 1, 0))):
        with Locations((-22.000213283, 22.000213283), (22.000213283, 22.000213283), (22.000213283, -22.000213283), (-22.000213283, -22.000213283)):
            CounterSinkHole(CSK_FOR_M3_FLAT_HEAD_MACHINE_SCREW1_D / 2, CSK_FOR_M3_FLAT_HEAD_MACHINE_SCREW1_CSINK_D / 2, counter_sink_angle=CSK_FOR_M3_FLAT_HEAD_MACHINE_SCREW1_CSINK_ANGLE)


solid = part.part
